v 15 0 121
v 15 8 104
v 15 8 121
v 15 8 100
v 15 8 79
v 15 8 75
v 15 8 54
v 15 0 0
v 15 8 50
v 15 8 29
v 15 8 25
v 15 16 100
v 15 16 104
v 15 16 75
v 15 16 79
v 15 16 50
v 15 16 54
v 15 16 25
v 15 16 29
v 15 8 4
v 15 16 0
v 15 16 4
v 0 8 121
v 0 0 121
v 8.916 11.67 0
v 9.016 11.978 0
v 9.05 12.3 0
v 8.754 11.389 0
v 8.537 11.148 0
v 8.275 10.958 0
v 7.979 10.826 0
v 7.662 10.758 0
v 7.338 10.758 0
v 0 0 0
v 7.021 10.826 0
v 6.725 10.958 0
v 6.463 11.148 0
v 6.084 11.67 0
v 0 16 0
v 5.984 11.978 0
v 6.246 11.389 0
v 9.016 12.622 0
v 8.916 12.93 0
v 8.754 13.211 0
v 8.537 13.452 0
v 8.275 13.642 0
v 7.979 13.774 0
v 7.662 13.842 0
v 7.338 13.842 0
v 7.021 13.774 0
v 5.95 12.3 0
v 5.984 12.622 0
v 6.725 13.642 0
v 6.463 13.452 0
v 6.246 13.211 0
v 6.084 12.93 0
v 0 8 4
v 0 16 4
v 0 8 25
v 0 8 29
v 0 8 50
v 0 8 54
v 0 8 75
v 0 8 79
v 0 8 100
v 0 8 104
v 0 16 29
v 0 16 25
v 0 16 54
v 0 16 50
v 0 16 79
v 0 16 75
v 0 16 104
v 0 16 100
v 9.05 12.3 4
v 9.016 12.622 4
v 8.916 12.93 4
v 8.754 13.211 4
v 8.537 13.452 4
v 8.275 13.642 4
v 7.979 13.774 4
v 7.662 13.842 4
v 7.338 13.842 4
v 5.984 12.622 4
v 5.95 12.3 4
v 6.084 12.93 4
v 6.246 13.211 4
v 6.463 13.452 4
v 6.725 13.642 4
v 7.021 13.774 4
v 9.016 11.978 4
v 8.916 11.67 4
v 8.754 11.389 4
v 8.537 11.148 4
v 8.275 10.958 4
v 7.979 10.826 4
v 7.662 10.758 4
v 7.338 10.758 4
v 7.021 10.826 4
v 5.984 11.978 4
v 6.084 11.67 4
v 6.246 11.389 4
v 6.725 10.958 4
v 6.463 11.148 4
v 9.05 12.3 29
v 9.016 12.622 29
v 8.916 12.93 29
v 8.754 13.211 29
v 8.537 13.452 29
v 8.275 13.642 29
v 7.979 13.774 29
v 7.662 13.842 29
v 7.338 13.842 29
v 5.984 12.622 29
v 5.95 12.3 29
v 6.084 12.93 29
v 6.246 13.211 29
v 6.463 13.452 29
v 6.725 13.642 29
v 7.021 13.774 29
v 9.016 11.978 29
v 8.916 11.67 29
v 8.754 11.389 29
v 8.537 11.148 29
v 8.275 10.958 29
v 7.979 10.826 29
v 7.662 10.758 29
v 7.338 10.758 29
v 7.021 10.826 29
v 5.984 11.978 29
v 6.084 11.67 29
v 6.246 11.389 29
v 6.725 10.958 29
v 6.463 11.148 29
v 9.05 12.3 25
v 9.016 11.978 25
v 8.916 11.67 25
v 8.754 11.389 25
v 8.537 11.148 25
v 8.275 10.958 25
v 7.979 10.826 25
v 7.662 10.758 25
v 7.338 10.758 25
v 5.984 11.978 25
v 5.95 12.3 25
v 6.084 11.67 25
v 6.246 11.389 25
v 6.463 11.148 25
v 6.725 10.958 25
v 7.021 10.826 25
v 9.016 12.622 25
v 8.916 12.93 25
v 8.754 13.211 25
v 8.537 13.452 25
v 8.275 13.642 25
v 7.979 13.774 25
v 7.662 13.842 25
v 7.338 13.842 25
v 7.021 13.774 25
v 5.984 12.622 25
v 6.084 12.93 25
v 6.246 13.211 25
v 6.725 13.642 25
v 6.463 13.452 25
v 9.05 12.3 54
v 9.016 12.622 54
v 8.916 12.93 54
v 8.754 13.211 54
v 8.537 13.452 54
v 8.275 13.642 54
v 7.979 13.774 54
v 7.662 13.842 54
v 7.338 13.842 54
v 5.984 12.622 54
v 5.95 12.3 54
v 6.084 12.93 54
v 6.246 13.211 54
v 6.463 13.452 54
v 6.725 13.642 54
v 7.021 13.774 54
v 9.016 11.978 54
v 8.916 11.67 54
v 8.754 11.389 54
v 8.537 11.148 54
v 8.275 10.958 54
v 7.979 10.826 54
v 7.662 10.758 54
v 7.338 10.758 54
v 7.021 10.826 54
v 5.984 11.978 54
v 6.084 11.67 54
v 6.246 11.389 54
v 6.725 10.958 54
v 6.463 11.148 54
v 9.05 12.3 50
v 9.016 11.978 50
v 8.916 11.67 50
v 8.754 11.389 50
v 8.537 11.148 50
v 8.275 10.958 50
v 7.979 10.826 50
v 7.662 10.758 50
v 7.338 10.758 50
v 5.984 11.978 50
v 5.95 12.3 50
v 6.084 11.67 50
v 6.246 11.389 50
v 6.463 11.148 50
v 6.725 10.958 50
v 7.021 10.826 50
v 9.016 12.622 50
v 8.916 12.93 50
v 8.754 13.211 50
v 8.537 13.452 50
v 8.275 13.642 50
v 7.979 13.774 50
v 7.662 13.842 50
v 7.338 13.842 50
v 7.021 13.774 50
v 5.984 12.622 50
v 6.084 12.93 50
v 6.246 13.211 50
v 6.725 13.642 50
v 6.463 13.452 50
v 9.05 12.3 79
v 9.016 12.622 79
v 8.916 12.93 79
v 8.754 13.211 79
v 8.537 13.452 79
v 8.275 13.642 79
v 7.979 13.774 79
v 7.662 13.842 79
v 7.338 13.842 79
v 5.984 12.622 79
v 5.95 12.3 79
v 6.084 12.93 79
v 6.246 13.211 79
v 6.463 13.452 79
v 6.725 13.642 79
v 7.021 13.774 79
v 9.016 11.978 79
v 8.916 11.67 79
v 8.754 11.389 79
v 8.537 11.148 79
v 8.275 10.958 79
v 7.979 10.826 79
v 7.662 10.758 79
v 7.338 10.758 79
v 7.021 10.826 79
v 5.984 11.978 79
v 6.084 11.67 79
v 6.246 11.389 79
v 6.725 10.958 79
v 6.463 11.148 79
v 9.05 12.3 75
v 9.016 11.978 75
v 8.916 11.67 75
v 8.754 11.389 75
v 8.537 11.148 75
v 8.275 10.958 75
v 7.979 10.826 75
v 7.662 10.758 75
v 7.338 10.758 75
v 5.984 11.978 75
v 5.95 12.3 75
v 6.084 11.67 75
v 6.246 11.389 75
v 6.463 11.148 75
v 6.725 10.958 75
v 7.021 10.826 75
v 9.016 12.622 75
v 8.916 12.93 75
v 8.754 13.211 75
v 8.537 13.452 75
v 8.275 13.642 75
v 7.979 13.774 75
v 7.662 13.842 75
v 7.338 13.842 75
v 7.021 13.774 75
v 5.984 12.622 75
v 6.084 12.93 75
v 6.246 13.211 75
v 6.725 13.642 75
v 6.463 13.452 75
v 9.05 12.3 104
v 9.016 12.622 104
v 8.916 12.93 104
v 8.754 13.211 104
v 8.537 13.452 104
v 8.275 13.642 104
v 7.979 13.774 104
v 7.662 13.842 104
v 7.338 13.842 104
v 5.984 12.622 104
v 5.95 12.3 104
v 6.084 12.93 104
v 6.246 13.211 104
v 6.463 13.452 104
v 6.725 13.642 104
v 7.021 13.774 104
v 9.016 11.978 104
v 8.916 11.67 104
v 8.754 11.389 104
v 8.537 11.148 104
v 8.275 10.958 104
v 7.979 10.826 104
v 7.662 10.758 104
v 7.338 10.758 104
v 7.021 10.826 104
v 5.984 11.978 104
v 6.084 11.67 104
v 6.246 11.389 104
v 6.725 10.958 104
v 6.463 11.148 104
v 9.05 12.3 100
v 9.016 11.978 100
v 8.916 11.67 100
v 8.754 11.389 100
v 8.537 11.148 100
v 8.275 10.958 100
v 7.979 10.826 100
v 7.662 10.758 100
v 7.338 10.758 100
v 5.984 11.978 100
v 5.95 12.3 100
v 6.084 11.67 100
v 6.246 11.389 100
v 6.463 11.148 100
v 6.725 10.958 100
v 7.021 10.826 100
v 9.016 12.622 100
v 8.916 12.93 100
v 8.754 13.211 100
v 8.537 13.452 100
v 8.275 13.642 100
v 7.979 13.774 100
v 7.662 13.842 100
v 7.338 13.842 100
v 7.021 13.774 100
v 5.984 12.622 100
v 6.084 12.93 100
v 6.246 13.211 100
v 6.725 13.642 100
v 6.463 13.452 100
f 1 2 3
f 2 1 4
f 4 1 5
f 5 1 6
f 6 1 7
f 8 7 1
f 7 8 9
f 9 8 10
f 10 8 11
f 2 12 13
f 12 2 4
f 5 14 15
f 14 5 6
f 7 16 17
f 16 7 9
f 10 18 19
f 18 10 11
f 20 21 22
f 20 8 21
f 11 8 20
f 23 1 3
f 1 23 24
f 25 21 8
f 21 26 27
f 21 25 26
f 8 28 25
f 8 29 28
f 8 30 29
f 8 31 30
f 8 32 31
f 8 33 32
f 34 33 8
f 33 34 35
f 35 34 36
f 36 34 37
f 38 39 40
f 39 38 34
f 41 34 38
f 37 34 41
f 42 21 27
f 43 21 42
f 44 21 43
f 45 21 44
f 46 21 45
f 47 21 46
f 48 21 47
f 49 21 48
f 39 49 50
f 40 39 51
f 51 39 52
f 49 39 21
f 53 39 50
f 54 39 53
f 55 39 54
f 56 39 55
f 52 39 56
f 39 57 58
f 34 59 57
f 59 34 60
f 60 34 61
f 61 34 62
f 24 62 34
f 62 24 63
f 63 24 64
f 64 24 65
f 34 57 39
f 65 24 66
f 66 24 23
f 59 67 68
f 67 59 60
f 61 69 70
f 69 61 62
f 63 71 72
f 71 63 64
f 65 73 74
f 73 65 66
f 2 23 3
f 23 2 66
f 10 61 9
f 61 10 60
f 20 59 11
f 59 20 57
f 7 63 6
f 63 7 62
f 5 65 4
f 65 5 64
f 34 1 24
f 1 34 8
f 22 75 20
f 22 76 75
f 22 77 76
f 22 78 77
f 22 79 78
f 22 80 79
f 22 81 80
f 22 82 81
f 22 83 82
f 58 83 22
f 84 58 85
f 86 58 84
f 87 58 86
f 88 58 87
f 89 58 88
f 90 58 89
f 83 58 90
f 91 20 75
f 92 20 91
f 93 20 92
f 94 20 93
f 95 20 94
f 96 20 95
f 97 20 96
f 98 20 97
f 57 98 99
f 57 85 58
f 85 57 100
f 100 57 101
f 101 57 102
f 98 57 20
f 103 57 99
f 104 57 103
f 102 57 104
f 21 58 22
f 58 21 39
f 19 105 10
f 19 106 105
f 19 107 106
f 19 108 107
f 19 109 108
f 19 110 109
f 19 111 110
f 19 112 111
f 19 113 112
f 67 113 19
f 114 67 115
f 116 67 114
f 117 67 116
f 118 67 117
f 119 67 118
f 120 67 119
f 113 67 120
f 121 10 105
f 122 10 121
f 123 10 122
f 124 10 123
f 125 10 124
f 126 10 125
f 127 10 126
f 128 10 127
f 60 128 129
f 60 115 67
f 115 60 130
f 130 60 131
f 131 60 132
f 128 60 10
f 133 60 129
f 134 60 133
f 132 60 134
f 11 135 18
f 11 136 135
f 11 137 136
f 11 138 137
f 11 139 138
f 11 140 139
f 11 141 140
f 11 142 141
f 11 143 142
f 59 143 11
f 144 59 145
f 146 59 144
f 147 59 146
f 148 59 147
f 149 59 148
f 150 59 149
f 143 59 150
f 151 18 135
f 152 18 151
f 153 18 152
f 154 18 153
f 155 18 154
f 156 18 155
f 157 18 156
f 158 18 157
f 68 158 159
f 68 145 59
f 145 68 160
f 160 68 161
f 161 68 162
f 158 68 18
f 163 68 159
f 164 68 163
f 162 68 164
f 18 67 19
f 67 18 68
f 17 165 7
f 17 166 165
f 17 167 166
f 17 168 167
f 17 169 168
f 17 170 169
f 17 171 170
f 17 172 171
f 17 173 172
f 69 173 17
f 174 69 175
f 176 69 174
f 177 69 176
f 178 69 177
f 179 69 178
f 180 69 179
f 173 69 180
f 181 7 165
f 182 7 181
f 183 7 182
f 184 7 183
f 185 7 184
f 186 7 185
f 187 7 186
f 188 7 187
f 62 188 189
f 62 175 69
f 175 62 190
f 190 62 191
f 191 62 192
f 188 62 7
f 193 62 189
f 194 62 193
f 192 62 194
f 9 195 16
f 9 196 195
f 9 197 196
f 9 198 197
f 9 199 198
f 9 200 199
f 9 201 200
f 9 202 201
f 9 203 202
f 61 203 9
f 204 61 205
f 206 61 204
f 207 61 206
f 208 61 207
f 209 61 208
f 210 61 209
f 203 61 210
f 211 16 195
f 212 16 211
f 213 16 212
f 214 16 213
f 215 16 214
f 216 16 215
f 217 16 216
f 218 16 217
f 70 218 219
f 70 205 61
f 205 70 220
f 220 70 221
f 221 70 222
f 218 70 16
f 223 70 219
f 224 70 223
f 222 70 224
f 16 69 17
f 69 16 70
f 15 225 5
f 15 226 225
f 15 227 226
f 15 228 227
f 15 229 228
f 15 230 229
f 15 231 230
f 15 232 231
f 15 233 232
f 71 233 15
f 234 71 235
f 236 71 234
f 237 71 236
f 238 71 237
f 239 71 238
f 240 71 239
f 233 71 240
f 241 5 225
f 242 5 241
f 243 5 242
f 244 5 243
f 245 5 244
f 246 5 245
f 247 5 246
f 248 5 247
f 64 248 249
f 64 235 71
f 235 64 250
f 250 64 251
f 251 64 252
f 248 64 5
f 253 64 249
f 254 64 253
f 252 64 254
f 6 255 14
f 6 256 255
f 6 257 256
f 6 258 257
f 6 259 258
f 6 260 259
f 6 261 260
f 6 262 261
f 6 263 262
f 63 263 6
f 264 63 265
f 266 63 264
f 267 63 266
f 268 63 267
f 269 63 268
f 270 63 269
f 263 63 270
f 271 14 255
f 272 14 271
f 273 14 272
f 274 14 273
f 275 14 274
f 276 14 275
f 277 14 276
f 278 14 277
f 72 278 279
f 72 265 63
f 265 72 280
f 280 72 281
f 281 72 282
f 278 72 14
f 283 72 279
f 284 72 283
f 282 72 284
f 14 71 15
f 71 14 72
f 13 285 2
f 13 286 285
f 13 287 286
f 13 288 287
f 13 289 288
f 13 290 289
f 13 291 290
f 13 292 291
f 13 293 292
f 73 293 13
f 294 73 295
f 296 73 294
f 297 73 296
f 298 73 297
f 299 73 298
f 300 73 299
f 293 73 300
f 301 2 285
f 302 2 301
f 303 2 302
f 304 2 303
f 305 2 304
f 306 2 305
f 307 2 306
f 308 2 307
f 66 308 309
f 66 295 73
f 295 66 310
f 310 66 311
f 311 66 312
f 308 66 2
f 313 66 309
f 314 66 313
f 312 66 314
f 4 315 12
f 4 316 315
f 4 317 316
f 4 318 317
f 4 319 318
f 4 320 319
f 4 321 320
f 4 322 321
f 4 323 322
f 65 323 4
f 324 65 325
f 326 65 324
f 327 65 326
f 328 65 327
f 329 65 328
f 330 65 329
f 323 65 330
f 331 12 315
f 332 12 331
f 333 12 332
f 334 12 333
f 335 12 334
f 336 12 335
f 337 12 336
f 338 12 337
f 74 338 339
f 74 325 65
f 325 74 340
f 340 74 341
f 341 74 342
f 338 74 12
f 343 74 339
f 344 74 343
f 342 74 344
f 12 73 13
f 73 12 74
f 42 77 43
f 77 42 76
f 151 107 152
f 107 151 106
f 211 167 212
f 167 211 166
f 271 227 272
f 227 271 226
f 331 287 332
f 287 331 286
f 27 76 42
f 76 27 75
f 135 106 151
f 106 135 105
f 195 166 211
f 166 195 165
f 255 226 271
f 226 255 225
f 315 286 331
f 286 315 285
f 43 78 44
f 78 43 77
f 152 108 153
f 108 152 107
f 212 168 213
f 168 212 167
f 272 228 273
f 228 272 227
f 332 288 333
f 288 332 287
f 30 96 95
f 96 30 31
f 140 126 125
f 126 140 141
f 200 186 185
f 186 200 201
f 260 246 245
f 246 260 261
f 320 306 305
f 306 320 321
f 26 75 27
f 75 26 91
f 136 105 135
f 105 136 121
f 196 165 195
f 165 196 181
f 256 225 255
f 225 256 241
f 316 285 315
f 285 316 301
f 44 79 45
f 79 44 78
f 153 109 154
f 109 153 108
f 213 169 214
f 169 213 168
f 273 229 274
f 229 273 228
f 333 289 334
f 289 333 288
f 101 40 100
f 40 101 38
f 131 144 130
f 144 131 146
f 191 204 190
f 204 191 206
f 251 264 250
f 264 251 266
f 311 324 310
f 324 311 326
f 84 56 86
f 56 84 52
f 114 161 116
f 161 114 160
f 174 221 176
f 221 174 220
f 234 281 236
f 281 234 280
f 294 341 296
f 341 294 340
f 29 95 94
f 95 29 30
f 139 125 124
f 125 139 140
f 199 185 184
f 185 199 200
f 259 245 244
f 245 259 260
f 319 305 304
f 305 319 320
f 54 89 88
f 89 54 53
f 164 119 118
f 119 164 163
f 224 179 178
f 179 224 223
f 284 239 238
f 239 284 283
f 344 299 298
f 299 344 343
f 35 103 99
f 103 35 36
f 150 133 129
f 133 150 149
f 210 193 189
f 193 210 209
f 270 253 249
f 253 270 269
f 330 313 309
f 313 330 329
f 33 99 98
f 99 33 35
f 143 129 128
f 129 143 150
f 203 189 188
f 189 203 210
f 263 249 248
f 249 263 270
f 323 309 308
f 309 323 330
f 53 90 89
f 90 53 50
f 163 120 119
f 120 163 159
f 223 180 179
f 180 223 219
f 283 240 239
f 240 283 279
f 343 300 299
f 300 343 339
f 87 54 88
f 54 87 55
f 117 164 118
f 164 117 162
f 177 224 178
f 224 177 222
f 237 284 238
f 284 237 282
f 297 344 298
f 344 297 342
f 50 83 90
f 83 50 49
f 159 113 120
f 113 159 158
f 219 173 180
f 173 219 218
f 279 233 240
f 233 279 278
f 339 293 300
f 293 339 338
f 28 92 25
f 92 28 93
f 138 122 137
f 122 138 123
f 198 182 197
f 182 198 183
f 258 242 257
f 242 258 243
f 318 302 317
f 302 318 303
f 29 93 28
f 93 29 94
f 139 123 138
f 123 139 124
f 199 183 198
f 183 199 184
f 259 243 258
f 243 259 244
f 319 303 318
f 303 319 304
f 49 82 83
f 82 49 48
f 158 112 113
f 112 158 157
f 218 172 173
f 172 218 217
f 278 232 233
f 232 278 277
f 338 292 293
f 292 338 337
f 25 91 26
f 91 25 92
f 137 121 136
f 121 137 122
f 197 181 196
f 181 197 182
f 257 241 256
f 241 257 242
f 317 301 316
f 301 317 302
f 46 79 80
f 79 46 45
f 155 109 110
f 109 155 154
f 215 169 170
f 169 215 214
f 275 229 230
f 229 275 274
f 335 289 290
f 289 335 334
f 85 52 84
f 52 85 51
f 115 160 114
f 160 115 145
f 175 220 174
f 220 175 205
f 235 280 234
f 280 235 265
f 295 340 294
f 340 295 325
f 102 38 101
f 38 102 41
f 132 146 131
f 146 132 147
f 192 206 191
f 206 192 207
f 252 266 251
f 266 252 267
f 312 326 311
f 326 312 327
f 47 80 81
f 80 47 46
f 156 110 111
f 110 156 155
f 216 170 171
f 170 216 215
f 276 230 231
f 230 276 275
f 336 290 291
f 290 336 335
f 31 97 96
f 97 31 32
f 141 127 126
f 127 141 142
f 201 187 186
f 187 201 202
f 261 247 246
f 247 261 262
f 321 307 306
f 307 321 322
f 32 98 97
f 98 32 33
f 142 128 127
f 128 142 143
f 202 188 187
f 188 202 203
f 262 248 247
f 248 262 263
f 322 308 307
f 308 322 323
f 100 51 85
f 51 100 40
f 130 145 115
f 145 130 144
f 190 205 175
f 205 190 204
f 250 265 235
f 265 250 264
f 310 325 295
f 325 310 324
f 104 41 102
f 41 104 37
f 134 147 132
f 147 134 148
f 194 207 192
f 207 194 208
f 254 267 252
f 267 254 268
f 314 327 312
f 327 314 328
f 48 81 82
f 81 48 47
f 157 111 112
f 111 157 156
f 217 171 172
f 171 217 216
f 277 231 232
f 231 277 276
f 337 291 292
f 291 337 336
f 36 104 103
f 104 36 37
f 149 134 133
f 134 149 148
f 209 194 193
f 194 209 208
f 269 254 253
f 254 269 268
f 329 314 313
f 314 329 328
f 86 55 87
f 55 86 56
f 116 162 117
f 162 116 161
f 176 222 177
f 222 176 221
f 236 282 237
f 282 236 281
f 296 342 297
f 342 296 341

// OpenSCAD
board_x=90;
board_y=70;
board_z=2;
board_offset=25;
hole_x_offset=2.1;
hole_y_offset=2.3;
hole=3.1;

mount_z=4;
mount_hole=3;
mount_x=15;
mount_x_offset=(mount_x/2)-hole_x_offset;
mount_y=8;
mount_extension=15;




module pcb() {
    difference() {
        cube(size=[board_x, board_y,board_z]);
        translate([hole_x_offset, hole_y_offset, 0]){
            cylinder(h=board_z , r=(hole/2), ,$fn=30);
        }
        translate([hole_x_offset, board_y-hole_y_offset, 0]){
            cylinder(h=board_z , r=(hole/2), ,$fn=30);
        }
        translate([board_x-hole_x_offset, board_y-hole_y_offset, 0]){
            cylinder(h=board_z , r=(hole/2), ,$fn=30);
        }
        translate([board_x-hole_x_offset, hole_y_offset, 0]){
            cylinder(h=board_z , r=(hole/2), ,$fn=30);
        }
    }
}

module boards() {
    color("SteelBlue", 1) {
        translate([mount_x_offset,mount_y,mount_z]){
            pcb();
        }
        translate([mount_x_offset,mount_y,mount_z+board_offset]){
            pcb();
        }
        translate([mount_x_offset,mount_y,mount_z+(board_offset*2)]){
            pcb();
        }    
        translate([mount_x_offset,mount_y,mount_z+(board_offset*3)]){
            pcb();
        }       
        translate([mount_x_offset,mount_y,mount_z+(board_offset*4)]){
            pcb();
        }    
    }
}



module mount() {
    difference() {
        translate([0,0,0]) {
            cube(size=[mount_x, mount_y, mount_extension+board_z+mount_z+(board_offset*4)]);
            translate([0,0,0]) {
                cube(size=[mount_x, mount_y*2,mount_z]);
            }
            translate([0,0,board_offset]) {
                cube(size=[mount_x, mount_y*2,mount_z]);
            }
            translate([0,0,board_offset*2]) {
                cube(size=[mount_x, mount_y*2,mount_z]);
            }
            translate([0,0,board_offset*3]) {
                cube(size=[mount_x, mount_y*2,mount_z]);
            }
            translate([0,0,board_offset*4]) {
                cube(size=[mount_x, mount_y*2,mount_z]);
            }
        }
        translate([mount_x/2,mount_y+hole_y_offset+2,0]) {
            cylinder(h=mount_extension+board_z+mount_z+(board_offset*4) , r=(hole/2),,$fn=30);
        }
    }
}

module lcd_mount() {
    cube(size=[10,60,10]);
    rotate([45, 0, 0]) {
        difference() {
            cube(size=[10,70,10]);
            translate([5,5,0]) {
            cylinder(h=mount_extension+board_z+mount_z+(board_offset*4) , 1.7, $fn=30);
            }
            translate([5,60,0]) {
            cylinder(h=10 , r=1.7, $fn=30);
            }
        }
    } 
}

//boards();
mount();
//lcd_mount();
